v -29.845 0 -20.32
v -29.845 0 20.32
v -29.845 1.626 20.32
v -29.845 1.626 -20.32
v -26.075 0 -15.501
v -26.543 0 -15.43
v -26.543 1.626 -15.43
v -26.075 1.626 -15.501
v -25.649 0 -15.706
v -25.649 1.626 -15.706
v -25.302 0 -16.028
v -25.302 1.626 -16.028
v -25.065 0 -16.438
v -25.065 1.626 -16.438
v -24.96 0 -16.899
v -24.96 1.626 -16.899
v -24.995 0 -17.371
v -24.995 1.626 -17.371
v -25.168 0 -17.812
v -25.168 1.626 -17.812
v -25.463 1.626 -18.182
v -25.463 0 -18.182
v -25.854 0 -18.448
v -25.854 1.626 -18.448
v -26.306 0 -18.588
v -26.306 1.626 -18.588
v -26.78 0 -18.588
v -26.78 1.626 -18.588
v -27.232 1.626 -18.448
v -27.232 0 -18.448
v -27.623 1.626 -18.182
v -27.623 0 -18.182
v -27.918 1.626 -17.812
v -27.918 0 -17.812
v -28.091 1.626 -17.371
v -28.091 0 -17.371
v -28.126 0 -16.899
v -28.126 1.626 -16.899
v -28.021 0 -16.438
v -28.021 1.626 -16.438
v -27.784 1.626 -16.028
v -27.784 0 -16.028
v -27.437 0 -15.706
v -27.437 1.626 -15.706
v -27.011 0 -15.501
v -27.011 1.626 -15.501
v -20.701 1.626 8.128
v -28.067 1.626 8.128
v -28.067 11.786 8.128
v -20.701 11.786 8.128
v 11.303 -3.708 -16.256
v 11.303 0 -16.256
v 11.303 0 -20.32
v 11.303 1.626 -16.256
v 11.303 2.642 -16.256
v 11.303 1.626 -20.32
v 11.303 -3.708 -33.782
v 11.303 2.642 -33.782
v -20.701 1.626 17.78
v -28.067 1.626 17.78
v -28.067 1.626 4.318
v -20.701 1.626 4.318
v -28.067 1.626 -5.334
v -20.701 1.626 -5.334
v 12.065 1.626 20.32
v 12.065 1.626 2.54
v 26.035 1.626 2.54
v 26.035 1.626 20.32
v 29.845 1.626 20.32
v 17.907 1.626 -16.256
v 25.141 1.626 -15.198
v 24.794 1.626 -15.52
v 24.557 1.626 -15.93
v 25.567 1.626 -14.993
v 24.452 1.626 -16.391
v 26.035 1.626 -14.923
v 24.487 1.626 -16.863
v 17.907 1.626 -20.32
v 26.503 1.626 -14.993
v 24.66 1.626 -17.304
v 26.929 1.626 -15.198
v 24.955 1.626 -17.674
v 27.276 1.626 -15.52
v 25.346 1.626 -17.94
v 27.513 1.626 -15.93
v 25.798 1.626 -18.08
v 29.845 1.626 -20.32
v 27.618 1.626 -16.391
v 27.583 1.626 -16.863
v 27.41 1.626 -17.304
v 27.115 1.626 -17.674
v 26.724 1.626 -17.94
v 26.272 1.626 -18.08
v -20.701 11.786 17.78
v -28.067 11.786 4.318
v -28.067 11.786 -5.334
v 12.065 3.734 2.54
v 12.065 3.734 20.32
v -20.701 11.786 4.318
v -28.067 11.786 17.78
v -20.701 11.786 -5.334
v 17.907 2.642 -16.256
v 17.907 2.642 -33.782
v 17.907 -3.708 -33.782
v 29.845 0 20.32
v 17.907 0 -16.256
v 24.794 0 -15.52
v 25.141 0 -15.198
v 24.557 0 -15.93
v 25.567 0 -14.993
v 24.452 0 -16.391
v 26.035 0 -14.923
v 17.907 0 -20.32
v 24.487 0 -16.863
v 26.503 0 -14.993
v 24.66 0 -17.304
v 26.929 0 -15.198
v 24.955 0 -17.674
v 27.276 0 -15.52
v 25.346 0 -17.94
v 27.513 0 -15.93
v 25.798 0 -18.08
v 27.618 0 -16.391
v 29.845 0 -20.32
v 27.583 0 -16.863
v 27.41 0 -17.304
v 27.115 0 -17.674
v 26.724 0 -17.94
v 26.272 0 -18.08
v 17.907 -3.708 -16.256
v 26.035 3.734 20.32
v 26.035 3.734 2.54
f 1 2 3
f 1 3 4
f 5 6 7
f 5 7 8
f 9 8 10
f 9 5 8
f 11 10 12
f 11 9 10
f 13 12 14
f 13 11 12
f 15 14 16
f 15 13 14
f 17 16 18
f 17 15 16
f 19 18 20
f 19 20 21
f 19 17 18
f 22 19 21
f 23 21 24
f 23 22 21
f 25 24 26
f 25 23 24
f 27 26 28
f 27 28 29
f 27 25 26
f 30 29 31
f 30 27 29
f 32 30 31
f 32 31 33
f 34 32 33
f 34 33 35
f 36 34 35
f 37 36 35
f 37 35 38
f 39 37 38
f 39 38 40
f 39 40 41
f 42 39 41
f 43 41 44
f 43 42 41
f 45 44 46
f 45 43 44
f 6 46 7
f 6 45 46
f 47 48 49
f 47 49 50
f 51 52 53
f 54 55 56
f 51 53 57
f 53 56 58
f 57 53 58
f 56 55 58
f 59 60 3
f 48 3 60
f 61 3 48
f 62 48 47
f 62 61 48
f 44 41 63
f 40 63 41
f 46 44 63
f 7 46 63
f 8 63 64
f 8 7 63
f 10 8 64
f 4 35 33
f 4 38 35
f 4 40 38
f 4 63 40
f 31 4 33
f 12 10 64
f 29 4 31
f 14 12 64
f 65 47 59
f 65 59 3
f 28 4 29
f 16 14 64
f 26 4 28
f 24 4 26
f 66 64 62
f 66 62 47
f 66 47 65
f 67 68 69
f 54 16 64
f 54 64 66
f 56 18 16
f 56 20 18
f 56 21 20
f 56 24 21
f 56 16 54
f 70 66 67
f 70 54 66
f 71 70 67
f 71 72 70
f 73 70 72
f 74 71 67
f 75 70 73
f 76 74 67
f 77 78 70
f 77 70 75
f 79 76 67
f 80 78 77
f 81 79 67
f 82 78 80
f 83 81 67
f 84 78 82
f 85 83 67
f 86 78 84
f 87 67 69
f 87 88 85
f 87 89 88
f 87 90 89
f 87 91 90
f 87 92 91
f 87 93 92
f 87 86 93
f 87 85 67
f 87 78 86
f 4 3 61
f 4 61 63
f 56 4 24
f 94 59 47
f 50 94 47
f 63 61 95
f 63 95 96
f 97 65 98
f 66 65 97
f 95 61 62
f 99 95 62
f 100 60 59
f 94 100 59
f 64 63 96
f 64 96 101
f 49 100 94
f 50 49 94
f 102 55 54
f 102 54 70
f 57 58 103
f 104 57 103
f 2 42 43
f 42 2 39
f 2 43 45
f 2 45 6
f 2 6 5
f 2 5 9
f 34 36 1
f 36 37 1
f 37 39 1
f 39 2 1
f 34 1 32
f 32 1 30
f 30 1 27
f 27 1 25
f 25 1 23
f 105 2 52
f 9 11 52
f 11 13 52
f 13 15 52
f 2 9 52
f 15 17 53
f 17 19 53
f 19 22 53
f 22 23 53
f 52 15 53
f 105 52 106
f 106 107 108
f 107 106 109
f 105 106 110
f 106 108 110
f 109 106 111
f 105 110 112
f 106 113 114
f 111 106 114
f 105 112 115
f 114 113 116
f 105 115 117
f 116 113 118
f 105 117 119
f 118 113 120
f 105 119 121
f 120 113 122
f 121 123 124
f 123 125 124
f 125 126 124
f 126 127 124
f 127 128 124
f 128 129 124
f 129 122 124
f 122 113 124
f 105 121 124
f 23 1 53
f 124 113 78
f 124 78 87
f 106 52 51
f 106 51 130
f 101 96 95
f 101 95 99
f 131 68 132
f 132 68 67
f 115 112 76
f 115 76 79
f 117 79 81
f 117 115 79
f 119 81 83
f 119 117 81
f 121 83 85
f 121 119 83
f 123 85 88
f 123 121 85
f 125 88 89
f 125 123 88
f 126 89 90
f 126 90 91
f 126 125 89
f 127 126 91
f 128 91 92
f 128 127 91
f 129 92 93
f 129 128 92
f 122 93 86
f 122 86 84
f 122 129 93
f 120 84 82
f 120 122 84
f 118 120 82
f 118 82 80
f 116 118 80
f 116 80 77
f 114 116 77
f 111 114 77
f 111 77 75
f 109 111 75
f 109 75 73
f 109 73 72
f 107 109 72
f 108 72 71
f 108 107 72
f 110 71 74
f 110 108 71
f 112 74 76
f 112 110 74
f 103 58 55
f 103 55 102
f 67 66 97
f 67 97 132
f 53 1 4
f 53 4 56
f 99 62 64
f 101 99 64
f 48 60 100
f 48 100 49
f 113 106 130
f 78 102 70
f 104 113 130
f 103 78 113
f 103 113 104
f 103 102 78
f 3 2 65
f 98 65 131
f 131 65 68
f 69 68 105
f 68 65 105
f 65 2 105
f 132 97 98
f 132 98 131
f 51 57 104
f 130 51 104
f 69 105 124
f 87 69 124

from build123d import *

# Parameters (mm, degrees)
SKETCH1_W           = 59.69
SKETCH1_H           = 40.64
SKETCH1_R           = 1.5875
BOSS_EXTRUDE1_DEPTH = 1.6256
SKETCH2_W           = 13.97
SKETCH2_H           = 17.78
BOSS_EXTRUDE2_DEPTH = 2.1082
BOSS_EXTRUDE3_START = 1.016
SKETCH3_W           = 6.604
SKETCH3_H           = 17.526
BOSS_EXTRUDE3_DEPTH = 6.35
SKETCH4_W           = 7.366
SKETCH4_H           = 9.652
BOSS_EXTRUDE4_DEPTH = 10.16


with BuildPart() as part:
    # Sketch1 → Boss-Extrude1 (new body)
    with BuildSketch(Plane(origin=(0, 0, 0), x_dir=(1, 0, 0), z_dir=(0, 1, 0))):
        Rectangle(SKETCH1_W, SKETCH1_H)
        with Locations(Location((26.035, 16.51, 0), (0, 0, 270))):
            Circle(SKETCH1_R, mode=Mode.SUBTRACT)
        with Locations(Location((-26.543, 17.018, 0), (0, 0, 270))):
            Circle(SKETCH1_R, mode=Mode.SUBTRACT)
    extrude(amount=BOSS_EXTRUDE1_DEPTH)

    # Sketch2 → Boss-Extrude2 (add)
    with BuildSketch(Plane(origin=(0, 1.6256, 0), x_dir=(1, 0, 0), z_dir=(0, 1, 0))):
        with Locations((19.05, -11.43)):
            Rectangle(SKETCH2_W, SKETCH2_H)
    extrude(amount=BOSS_EXTRUDE2_DEPTH)

    # Sketch3 → Boss-Extrude3 (add)
    with BuildSketch(Plane(origin=(0, 1.6256, 0), x_dir=(1, 0, 0), z_dir=(0, 1, 0)).offset(BOSS_EXTRUDE3_START)):
        with Locations((14.605, 25.019)):
            Rectangle(SKETCH3_W, SKETCH3_H)
    extrude(amount=-BOSS_EXTRUDE3_DEPTH)

    # Sketch4 → Boss-Extrude4 (add)
    with BuildSketch(Plane(origin=(0, 1.6256, 0), x_dir=(1, 0, 0), z_dir=(0, 1, 0))):
        with Locations((-24.384, -12.954)):
            Rectangle(SKETCH4_W, SKETCH4_H)
        with Locations((-24.384, 0.508)):
            Rectangle(SKETCH4_W, SKETCH4_H)
    extrude(amount=BOSS_EXTRUDE4_DEPTH)


solid = part.part
